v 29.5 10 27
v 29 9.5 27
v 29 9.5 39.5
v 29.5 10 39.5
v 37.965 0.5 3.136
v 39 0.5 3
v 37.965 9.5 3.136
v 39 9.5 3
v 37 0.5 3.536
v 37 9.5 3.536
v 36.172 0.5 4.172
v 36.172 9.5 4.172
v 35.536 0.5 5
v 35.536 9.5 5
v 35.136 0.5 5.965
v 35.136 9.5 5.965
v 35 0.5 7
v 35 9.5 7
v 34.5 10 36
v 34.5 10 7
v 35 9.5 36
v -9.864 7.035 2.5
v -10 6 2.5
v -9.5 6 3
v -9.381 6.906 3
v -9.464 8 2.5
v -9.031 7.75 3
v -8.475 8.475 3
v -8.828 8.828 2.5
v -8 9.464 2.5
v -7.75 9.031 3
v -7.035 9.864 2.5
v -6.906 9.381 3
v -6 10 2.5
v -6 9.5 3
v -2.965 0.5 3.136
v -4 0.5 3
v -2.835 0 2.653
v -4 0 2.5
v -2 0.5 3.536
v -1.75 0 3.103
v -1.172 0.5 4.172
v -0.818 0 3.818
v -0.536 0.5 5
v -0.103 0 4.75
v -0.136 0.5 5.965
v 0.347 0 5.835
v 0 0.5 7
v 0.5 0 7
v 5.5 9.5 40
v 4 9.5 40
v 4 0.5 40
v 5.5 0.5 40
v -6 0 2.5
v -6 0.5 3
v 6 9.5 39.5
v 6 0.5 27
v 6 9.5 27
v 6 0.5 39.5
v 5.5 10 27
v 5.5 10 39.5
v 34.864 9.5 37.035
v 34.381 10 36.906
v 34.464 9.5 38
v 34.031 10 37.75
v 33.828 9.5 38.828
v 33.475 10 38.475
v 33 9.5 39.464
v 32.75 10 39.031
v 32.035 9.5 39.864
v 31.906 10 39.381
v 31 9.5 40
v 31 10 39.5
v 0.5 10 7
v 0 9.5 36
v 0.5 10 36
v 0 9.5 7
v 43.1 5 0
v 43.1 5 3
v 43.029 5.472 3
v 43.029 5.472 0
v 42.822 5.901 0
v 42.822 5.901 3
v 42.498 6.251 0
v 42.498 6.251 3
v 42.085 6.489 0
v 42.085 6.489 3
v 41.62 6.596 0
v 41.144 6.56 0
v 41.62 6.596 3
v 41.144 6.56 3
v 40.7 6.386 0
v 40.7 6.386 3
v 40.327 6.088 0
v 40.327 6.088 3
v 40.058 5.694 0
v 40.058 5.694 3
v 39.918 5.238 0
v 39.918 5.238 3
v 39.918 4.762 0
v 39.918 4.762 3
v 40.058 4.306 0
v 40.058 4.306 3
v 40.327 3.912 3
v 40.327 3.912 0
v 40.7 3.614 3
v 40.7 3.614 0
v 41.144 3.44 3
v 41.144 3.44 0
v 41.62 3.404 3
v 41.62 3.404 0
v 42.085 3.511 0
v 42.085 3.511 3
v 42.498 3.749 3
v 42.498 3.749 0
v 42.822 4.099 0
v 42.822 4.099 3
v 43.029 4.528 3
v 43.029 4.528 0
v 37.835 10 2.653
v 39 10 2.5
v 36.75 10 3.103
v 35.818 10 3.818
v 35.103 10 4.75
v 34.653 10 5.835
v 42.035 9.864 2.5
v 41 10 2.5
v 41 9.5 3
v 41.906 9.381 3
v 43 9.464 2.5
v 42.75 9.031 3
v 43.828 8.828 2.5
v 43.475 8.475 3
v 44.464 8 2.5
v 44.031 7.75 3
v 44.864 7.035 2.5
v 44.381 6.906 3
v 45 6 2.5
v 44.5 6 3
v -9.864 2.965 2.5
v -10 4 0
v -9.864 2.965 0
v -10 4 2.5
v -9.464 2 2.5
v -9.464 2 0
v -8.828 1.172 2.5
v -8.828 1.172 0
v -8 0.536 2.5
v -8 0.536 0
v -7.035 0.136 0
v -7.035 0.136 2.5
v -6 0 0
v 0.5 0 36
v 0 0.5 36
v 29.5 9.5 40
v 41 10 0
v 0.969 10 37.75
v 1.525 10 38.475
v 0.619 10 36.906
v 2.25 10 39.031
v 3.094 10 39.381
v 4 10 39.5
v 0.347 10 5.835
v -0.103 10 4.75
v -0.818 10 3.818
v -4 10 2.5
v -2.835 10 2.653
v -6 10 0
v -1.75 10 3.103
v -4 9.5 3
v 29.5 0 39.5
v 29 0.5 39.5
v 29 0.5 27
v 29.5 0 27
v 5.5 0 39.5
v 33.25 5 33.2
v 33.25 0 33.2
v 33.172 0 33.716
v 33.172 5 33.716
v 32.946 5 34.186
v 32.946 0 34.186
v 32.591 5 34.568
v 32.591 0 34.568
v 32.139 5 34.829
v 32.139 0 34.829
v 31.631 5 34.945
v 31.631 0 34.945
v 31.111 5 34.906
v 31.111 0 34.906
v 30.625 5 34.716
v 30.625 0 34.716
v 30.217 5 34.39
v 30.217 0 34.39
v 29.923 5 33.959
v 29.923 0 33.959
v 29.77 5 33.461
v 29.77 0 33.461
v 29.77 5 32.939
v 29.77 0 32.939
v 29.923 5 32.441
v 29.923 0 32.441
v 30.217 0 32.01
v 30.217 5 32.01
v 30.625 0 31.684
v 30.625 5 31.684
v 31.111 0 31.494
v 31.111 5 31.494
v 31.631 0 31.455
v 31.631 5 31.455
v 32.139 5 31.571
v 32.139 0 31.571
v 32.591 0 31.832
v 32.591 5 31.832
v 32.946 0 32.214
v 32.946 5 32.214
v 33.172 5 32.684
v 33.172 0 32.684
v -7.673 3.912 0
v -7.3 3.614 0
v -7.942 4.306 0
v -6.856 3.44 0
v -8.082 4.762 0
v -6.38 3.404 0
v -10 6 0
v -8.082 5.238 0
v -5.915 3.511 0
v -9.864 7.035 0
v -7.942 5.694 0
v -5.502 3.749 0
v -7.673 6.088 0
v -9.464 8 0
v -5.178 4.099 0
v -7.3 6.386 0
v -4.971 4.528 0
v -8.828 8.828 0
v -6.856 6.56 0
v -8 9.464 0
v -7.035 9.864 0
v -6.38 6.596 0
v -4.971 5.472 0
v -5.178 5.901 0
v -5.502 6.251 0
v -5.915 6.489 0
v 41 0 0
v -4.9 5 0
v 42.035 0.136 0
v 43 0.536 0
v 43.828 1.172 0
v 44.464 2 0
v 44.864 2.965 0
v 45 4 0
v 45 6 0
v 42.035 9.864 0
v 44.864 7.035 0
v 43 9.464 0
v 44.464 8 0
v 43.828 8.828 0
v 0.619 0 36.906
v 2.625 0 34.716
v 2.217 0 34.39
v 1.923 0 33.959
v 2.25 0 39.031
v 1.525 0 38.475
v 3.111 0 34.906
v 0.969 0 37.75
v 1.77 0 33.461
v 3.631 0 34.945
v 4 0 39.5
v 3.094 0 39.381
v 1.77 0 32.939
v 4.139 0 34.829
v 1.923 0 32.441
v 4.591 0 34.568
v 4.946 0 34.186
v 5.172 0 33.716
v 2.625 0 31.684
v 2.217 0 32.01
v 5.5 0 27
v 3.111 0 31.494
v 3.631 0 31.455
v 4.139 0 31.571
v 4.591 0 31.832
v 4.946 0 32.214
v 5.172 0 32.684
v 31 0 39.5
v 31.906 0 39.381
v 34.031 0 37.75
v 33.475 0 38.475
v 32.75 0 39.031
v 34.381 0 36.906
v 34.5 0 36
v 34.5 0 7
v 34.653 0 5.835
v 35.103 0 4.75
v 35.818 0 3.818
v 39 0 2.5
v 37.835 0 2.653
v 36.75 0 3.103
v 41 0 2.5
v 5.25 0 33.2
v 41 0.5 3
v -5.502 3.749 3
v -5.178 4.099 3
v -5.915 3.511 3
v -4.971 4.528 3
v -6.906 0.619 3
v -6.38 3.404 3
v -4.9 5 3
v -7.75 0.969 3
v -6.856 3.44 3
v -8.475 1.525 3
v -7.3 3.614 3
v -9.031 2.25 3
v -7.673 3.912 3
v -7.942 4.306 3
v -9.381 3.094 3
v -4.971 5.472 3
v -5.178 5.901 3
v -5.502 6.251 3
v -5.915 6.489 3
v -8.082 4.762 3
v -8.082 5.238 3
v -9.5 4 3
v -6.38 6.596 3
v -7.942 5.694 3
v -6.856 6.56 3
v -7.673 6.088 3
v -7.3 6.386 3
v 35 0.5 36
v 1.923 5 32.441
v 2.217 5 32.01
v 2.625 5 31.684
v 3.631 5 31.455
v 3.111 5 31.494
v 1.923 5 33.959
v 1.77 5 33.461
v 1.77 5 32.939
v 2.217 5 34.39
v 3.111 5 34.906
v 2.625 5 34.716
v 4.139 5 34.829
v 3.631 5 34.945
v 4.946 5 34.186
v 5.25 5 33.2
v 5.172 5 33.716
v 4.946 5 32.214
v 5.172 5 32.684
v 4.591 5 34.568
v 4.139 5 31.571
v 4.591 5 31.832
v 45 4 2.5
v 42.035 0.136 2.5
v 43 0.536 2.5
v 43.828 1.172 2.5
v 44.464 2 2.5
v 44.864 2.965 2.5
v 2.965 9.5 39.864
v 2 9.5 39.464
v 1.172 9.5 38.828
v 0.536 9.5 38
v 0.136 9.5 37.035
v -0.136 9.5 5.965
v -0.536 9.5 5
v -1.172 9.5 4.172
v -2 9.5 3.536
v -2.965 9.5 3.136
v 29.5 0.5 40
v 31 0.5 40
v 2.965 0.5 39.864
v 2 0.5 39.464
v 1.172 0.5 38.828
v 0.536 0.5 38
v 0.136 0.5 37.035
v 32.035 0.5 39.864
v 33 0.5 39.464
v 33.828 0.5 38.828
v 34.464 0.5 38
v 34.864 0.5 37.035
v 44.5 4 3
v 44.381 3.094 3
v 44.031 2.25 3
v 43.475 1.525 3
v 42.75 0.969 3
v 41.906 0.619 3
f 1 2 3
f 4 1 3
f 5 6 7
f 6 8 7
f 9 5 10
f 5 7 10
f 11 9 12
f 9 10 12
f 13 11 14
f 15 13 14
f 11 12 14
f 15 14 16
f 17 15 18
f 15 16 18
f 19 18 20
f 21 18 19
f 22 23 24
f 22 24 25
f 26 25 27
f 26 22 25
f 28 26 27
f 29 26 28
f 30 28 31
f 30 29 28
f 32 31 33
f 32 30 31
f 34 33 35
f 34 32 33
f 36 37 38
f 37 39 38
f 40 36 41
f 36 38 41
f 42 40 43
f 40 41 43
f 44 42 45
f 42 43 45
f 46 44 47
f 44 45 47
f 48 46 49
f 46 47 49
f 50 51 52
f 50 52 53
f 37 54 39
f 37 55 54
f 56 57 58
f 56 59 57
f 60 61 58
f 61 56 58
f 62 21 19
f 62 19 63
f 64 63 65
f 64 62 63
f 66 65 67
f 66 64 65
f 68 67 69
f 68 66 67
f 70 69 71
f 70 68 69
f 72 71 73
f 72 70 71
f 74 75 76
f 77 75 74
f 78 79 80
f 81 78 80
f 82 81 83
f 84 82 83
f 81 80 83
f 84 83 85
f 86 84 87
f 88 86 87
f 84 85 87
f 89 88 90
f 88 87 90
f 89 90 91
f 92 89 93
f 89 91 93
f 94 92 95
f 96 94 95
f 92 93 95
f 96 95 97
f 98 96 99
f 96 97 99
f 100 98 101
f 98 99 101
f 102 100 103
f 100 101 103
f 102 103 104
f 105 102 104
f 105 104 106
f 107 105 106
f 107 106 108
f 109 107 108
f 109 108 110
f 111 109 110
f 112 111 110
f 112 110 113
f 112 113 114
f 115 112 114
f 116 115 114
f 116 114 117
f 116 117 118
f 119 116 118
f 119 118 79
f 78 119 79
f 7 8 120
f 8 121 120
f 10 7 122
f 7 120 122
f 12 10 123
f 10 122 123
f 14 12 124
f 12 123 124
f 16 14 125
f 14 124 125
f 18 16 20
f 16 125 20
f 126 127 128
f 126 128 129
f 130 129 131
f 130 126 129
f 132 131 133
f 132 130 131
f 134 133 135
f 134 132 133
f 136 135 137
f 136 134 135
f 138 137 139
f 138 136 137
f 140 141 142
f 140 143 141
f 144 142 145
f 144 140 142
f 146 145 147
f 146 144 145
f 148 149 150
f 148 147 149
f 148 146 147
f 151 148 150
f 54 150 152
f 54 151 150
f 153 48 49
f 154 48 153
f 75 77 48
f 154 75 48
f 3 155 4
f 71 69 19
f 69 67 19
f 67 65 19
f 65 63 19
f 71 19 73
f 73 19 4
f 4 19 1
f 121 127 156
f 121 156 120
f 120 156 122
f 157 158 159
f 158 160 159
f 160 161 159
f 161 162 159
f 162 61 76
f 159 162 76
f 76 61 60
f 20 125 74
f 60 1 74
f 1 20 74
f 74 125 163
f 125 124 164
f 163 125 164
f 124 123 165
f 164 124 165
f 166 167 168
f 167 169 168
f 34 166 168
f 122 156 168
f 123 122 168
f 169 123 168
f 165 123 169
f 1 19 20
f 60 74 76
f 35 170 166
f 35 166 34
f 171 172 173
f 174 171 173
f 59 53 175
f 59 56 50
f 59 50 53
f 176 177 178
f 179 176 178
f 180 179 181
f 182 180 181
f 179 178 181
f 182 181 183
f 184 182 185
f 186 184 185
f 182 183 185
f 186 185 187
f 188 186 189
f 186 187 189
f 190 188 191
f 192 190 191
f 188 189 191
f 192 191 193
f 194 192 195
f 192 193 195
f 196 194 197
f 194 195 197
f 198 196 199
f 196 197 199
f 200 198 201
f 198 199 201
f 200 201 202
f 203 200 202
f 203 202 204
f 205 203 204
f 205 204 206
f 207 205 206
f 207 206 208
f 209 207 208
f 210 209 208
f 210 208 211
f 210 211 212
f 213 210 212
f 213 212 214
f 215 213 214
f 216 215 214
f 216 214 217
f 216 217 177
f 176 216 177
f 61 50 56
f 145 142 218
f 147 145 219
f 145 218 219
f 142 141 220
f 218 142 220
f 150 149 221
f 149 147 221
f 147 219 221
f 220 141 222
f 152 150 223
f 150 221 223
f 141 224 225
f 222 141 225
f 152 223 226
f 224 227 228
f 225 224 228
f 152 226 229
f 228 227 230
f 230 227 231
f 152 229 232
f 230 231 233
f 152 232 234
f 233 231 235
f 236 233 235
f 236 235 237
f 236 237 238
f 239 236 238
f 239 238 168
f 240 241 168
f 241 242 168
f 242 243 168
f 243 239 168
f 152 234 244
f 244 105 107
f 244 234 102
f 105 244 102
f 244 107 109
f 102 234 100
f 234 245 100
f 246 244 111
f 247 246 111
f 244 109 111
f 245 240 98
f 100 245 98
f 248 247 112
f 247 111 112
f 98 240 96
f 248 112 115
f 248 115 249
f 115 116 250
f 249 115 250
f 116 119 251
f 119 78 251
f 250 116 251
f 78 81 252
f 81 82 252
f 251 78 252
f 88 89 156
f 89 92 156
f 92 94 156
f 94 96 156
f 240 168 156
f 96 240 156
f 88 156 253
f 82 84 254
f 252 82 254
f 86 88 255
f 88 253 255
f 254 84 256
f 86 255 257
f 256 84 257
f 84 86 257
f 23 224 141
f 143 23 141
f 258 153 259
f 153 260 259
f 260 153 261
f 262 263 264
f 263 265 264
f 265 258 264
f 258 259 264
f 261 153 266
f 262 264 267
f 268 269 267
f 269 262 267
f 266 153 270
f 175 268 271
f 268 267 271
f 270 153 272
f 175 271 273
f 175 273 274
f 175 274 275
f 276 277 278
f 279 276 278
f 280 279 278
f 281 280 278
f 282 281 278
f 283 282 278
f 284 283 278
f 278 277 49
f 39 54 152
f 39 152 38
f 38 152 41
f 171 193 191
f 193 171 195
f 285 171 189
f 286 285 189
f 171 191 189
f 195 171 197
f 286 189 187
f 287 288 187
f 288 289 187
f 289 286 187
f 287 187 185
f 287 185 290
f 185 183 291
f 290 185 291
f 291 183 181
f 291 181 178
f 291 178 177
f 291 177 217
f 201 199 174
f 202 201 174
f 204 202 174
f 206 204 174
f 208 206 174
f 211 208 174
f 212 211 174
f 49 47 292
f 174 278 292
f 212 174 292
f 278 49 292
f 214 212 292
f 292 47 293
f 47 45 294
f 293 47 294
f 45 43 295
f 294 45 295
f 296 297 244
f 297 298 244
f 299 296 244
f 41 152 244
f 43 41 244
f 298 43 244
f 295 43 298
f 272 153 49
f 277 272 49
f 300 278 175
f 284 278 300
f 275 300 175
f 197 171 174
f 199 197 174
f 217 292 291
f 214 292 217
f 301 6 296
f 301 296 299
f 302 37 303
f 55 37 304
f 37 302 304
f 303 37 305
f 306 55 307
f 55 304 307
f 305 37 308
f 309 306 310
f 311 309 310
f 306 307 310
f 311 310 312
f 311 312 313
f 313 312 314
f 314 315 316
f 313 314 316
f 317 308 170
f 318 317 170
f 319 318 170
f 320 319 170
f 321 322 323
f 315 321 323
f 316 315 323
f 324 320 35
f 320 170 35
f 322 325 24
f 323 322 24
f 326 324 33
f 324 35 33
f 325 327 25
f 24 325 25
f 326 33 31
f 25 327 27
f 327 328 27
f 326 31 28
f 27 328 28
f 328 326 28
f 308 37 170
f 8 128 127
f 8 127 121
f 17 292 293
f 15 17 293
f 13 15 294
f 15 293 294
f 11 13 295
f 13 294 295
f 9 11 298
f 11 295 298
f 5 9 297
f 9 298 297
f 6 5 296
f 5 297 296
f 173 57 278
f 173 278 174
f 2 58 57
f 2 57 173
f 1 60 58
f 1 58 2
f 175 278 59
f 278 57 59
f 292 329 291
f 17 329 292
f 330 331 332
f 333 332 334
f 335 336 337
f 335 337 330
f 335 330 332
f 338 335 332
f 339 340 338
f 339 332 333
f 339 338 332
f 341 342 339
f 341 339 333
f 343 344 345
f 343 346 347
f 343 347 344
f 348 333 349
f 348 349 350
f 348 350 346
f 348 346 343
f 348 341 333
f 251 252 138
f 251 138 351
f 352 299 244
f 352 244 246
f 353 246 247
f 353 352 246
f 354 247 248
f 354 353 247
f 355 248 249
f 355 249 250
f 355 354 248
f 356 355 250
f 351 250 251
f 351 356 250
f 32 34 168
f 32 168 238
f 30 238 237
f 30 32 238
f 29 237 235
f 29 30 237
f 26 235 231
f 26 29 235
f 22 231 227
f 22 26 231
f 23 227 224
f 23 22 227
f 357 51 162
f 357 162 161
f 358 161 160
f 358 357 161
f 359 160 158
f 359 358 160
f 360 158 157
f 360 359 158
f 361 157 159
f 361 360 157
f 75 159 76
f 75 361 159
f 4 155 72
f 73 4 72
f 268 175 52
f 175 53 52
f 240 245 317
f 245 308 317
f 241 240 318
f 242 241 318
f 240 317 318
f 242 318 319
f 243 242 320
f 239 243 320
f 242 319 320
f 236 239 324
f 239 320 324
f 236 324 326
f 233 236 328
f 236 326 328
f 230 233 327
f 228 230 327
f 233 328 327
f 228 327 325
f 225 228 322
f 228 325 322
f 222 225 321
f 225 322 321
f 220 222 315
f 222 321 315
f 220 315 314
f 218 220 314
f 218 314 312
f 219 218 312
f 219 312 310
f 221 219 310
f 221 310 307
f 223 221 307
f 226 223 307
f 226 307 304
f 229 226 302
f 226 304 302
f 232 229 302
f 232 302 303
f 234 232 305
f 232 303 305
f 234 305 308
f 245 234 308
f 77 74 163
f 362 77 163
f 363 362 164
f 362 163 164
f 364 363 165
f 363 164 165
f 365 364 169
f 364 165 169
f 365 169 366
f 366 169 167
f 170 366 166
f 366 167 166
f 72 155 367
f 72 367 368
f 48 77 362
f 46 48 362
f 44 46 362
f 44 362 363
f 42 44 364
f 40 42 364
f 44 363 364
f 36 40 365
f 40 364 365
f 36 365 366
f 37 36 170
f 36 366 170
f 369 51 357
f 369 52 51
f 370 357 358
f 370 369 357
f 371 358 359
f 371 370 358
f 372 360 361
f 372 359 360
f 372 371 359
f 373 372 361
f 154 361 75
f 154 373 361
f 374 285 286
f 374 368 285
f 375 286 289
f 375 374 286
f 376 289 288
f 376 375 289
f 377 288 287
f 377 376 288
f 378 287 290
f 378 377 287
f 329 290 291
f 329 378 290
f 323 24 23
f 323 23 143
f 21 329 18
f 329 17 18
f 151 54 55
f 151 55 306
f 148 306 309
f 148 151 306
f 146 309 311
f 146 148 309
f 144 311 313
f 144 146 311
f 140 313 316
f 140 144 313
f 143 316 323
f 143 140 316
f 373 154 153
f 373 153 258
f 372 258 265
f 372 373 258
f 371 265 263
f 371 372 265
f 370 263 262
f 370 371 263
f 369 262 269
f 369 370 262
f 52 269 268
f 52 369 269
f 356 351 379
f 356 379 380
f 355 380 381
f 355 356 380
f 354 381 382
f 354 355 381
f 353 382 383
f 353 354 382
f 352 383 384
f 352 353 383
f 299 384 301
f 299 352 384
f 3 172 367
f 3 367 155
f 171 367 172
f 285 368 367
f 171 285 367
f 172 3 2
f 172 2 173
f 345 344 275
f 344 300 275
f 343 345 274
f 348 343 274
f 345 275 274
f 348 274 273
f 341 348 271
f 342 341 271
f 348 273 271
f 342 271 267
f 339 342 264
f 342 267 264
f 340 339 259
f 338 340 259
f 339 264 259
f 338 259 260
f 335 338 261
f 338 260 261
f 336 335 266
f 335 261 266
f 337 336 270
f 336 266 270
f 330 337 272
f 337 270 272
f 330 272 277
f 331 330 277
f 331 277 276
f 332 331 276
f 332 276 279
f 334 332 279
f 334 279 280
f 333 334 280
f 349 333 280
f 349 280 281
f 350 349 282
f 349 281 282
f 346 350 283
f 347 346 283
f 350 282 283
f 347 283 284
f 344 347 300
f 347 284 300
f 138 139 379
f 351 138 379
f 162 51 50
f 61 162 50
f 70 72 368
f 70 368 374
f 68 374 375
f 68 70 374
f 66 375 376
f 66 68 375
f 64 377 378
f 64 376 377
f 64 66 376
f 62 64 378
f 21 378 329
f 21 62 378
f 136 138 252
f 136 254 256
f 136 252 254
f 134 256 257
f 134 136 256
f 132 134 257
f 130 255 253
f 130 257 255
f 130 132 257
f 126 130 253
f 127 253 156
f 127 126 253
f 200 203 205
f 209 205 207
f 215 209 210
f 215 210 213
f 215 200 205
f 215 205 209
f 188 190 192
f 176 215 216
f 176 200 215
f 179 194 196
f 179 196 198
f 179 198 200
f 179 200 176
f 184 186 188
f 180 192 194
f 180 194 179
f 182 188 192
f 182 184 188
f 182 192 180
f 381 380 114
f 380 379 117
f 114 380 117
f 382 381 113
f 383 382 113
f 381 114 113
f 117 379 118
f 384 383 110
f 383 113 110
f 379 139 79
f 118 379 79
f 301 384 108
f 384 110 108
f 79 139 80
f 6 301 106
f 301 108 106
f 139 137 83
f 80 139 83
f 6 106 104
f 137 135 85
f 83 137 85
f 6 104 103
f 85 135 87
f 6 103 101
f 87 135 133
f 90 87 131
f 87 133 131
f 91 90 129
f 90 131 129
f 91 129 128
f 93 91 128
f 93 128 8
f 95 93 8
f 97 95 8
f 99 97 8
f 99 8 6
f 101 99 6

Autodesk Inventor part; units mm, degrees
ref_plane "YZ Plane" through (0, 0, 0) normal (1, 0, 0) x (0, 1, 0)
ref_plane "XZ Plane" through (0, 0, 0) normal (0, 1, 0) x (-1, 0, 0)
ref_plane "XY Plane" through (0, 0, 0) normal (0, 0, 1) x (1, 0, 0)
sketch "Boceto1" plane through (0, 0, 0) normal (0, 0, 1) x (1, 0, 0)
  line L0 (0, 0) -> (35, 0)
  line L1 (35, 0) -> (35, 10)
  line L2 (35, 10) -> (0, 10)
  line L3 (0, 10) -> (0, 0)
  dimension "d0" = 35
  dimension "d1" = 10
extrude "Extrusión1" add sketch "Boceto1" along normal blind 40
sketch "Boceto2" plane through (0, 0, 40) normal (0, 0, 1) x (1, 0, 0)
  line L0 (35, 0) -> (35, 10) construction
  line L1 (35, 10) -> (0, 10) construction
  line L2 (0, 10) -> (0, 0) construction
  line L3 (0, 0) -> (35, 0) construction
  line L4 (35, 10) -> (0, 10) projected
  line L5 (0, 0) -> (35, 0) projected
  line L6 (6, 10) -> (29, 10)
  line L7 (29, 10) -> (29, 0)
  line L8 (29, 0) -> (6, 0)
  line L9 (6, 0) -> (6, 10)
  line L10 (17.5, 10) -> (17.5, 0) construction
  dimension "d4" = 23
  dimension "d5" = 11.5
extrude "Extrusión2" cut sketch "Boceto2" against normal blind 13
sketch "Boceto3" plane through (0, 0, 0) normal (0, 0, -1) x (-1, 0, 0)
  line L0 (-35, 0) -> (-35, 10) construction
  line L1 (0, 0) -> (-35, 0) construction
  line L2 (0, 10) -> (0, 0) construction
  line L3 (-35, 10) -> (0, 10) construction
  line L4 (-35, 10) -> (-45, 10)
  line L5 (-45, 10) -> (-45, 0)
  line L6 (-45, 0) -> (-35, 0)
  line L7 (-35, 0) -> (-35, 10)
  line L8 (-6, 10) -> (0, 10) projected
  line L9 (0, 10) -> (10, 10)
  line L10 (10, 10) -> (10, 0)
  line L11 (10, 0) -> (0, 0)
  line L12 (0, 0) -> (0, 10)
  line L13 (-35, 0) -> (-35, 10) construction
  line L14 (0, 10) -> (0, 0) construction
  dimension "d8" = 10
  dimension "d9" = 10
extrude "Extrusión3" add sketch "Boceto3" against normal blind 3
fillet "Empalme1" radius 4 8 edges at (-10, 0, 1.5) (-10, 10, 1.5) (45, 0, 1.5) (45, 10, 1.5) (0, 5, 40) (35, 5, 40) (0, 5, 3) (35, 5, 3)
sketch "Boceto5" plane through (0, 0, 3) normal (0, 0, 1) x (1, 0, 0)
  line L0 (-4, 10) -> (-4, 0) construction
  line L1 (-4, 10) -> (-6, 10) construction
  arc A0 (-6, 10) -> (-10, 6) centre (-6, 6) ccw construction
  line L2 (-10, 6) -> (-10, 4) construction
  arc A1 (-10, 4) -> (-6, 0) centre (-6, 4) ccw construction
  line L3 (-6, 0) -> (-4, 0) construction
  line L4 (39, 0) -> (39, 10) construction
  line L5 (39, 0) -> (41, 0) construction
  arc A2 (41, 0) -> (45, 4) centre (41, 4) ccw construction
  line L6 (45, 4) -> (45, 6) construction
  arc A3 (45, 6) -> (41, 10) centre (41, 6) ccw construction
  line L7 (41, 10) -> (39, 10) construction
  line L8 (-10, 5) -> (45, 5) construction
  circle A4 centre (-6.5, 5) radius 1.6
  circle A5 centre (41.5, 5) radius 1.6
  point P0 (0, 0)
  dimension "d15" = 3.2
  dimension "d16" = 3.2
  dimension "d17" = 3.5
  dimension "d18" = 3.5
extrude "Extrusión4" cut sketch "Boceto5" against normal blind 10
chamfer "Chaflán1" distance 0.5 angle 45 28 edges at (-8.8284, 1.1716, 3) (-10, 5, 3) (-8.8284, 8.8284, 3) (-5, 10, 3) (0, 10, 21.5) (1.1716, 10, 38.8284) (5, 10, 40) (-5, 0, 3) (0, 0, 21.5) (1.1716, 0, 38.8284) (5, 0, 40) (40, 0, 3) (43.8284, 1.1716, 3) (45, 5, 3) (43.8284, 8.8284, 3) (40, 10, 3) (35, 10, 21.5) (33.8284, 10, 38.8284) (30, 10, 40) (35, 0, 21.5) (33.8284, 0, 38.8284) (30, 0, 40) (6, 5, 40) (29, 5, 40) (6, 0, 33.5) (6, 10, 33.5) (29, 0, 33.5) (29, 10, 33.5)
sketch "Boceto6" plane through (-6, 0, 0) normal (0, -1, 0) x (1, 0, 0)
  line L0 (45, 2.5) -> (47, 2.5) construction
  arc A0 (40.5, 7) -> (45, 2.5) centre (45, 7) ccw construction
  line L1 (40.5, 36) -> (40.5, 7) construction
  arc A1 (40.5, 36) -> (37, 39.5) centre (37, 36) ccw construction
  line L2 (35.5, 39.5) -> (37, 39.5) construction
  line L3 (35.5, 27) -> (35.5, 39.5) construction
  line L4 (35.5, 27) -> (11.5, 27) construction
  line L5 (11.5, 39.5) -> (11.5, 27) construction
  line L6 (10, 39.5) -> (11.5, 39.5) construction
  arc A2 (10, 39.5) -> (6.5, 36) centre (10, 36) ccw construction
  line L7 (6.5, 7) -> (6.5, 36) construction
  arc A3 (2, 2.5) -> (6.5, 7) centre (2, 7) ccw construction
  line L8 (0, 2.5) -> (2, 2.5) construction
  line L9 (0, 0) -> (0, 2.5) construction
  line L10 (47, 0) -> (0, 0) construction
  line L11 (47, 2.5) -> (47, 0) construction
  arc A4 (10, 39.5) -> (6.5, 36) centre (10, 36) ccw construction
  line L12 (9.5, 39.4641) -> (9.5, 0) construction
  line L13 (47, 0) -> (0, 0) construction
  arc A5 (40.5, 36) -> (37, 39.5) centre (37, 36) ccw construction
  line L14 (37.5, 39.4641) -> (37.5, 0) construction
  line L15 (23.5, 0) -> (23.5, 27) construction
  line L16 (6.5, 33.2) -> (40.5, 33.2) construction
  line L17 (40.5, 7) -> (40.5, 36) construction
  circle A6 centre (9.5, 33.2) radius 1.75
  circle A7 centre (37.5, 33.2) radius 1.75
  point P0 (6, 0)
  dimension "d26" = 28
  dimension "d27" = 14
  dimension "d28" = 6.2
  dimension "d29" = 3.5
  dimension "d30" = 3.5
extrude "Extrusión5" cut sketch "Boceto6" against normal blind 5
equation "\"d5\" = 0.5 * d4"
equation "\"d27\" = 0.5 * d26"
properties part number "base_servo"
